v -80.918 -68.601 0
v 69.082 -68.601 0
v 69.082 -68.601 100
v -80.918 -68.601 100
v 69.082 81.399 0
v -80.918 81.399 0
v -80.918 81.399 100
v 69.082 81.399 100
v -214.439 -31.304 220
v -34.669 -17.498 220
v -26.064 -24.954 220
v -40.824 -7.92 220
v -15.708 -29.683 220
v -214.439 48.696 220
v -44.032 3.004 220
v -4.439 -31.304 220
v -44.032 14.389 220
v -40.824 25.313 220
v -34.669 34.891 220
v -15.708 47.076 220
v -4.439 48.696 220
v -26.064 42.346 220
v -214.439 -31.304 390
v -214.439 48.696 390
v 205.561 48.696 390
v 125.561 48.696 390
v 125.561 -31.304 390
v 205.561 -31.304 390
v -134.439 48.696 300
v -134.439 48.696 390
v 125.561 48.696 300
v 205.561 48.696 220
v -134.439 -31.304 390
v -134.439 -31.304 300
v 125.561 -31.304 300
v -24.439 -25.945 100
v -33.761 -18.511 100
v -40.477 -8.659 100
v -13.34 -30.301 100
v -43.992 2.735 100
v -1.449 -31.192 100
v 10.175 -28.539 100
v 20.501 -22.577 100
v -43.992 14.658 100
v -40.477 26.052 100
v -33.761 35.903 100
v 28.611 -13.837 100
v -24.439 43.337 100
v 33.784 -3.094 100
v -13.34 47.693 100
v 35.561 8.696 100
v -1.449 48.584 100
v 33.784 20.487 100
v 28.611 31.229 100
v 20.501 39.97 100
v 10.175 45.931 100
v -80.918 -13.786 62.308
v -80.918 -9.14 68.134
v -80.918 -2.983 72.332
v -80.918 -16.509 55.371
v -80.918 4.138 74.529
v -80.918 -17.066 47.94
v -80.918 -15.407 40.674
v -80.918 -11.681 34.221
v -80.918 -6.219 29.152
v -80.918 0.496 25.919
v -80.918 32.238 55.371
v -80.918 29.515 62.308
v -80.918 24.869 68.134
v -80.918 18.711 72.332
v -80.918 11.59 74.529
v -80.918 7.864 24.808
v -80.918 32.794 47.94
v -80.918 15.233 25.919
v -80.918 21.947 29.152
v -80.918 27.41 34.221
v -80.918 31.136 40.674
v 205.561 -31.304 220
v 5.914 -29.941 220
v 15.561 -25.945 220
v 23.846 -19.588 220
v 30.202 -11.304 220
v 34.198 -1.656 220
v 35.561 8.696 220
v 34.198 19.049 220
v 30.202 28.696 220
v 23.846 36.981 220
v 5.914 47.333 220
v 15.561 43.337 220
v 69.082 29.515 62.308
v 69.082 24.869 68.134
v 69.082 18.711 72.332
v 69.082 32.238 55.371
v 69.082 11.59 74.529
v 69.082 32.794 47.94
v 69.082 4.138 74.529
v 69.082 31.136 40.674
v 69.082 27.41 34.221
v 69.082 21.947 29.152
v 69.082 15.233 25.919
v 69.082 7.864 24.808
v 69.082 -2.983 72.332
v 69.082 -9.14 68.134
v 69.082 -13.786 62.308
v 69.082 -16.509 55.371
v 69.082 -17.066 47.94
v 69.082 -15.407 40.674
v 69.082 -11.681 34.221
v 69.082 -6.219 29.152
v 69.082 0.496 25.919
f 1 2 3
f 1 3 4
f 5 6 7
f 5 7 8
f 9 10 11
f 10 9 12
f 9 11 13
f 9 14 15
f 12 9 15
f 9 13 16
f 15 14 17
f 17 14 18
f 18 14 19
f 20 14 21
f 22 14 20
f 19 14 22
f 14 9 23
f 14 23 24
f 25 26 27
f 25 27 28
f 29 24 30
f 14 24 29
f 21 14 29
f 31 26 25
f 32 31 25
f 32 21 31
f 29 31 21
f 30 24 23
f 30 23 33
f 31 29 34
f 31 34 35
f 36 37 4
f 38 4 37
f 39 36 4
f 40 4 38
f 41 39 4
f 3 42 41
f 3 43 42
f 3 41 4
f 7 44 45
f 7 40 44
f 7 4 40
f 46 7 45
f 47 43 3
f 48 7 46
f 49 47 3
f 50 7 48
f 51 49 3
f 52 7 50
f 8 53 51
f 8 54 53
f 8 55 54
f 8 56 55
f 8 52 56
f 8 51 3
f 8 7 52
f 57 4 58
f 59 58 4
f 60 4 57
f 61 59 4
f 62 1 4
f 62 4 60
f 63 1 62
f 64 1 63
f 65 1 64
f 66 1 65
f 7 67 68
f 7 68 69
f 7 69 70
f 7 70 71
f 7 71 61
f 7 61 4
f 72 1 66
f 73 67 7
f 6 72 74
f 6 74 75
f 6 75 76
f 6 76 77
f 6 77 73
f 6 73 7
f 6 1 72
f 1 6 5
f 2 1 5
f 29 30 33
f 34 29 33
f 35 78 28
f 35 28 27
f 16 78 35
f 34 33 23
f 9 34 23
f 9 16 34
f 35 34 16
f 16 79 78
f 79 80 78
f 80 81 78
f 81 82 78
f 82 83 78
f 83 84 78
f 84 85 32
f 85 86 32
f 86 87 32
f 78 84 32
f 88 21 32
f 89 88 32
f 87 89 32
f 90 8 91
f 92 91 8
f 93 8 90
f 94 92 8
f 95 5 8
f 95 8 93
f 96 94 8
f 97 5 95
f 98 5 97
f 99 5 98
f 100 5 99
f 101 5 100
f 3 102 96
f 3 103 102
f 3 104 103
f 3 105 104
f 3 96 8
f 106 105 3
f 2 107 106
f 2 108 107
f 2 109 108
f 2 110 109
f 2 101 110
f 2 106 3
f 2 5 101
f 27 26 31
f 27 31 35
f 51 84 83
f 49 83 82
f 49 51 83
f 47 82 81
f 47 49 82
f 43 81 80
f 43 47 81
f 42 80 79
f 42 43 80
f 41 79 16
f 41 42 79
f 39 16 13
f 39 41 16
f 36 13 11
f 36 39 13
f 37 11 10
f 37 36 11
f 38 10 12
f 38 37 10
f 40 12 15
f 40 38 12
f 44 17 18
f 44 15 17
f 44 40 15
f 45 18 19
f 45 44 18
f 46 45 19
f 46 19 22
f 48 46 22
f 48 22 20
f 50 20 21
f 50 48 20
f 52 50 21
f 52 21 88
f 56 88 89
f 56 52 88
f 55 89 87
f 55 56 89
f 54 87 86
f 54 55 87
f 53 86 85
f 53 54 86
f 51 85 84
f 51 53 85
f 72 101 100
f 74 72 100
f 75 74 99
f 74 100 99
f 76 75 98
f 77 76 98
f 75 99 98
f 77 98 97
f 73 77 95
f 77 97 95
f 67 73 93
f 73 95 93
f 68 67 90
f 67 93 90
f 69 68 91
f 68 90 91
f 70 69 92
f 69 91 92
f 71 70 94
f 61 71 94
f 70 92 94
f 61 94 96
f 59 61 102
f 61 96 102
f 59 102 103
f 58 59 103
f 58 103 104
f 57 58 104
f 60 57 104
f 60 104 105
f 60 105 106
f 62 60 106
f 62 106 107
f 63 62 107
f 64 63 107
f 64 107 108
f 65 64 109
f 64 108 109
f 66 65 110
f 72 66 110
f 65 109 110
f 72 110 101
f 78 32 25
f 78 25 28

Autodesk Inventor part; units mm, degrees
ref_plane "YZ Plane" through (0, 0, 0) normal (1, 0, 0) x (0, 1, 0)
ref_plane "XZ Plane" through (0, 0, 0) normal (0, 1, 0) x (-1, 0, 0)
ref_plane "XY Plane" through (0, 0, 0) normal (0, 0, 1) x (1, 0, 0)
sketch "Sketch1" plane through (0, 0, 0) normal (0, 0, 1) x (1, 0, 0)
  line L0 (-80.9183, 81.3988) -> (69.0817, 81.3988)
  line L1 (69.0817, 81.3988) -> (69.0817, -68.6012)
  line L2 (69.0817, -68.6012) -> (-80.9183, -68.6012)
  line L3 (-80.9183, -68.6012) -> (-80.9183, 81.3988)
  line L4 (-80.9183, 81.3988) -> (69.0817, -68.6012) construction
  line L5 (69.0817, 81.3988) -> (-80.9183, -68.6012) construction
  point P0 (0, 0)
  point P1 (-5.9183, 6.3988)
  dimension "d0" = 150
  dimension "d1" = 150
extrude "Extrusion1" add sketch "Sketch1" along normal blind 100
sketch "Sketch2" plane through (0, 0, 100) normal (0, 0, 1) x (1, 0, 0)
  circle A0 centre (-4.4387, 8.6963) radius 40
  point P0 (0, 0)
  dimension "d4" = 80
extrude "Extrusion2" add sketch "Sketch2" along normal blind 120
sketch "Sketch3" plane through (-4.4387, 8.6963, 220) normal (0, 0, 1) x (1, 0, 0)
  line L0 (-210, 40) -> (210, 40)
  line L1 (210, 40) -> (210, -40)
  line L2 (210, -40) -> (-210, -40)
  line L3 (-210, -40) -> (-210, 40)
  circle A0 centre (0, 0) radius 40 projected
  line L4 (-210, 40) -> (210, -40) construction
  line L5 (210, 40) -> (-210, -40) construction
  point P0 (4.4387, -8.6963)
  dimension "d7" = 420
  dimension "d8" = 80
extrude "Extrusion3" add sketch "Sketch3" along normal blind 80
sketch "Sketch4" plane through (-4.4387, 8.6963, 300) normal (0, 0, 1) x (1, 0, 0)
  line L0 (210, 40) -> (-210, 40) projected
  line L1 (-210, -40) -> (210, -40) projected
  line L2 (-210, 40) -> (-130, 40)
  line L3 (-130, 40) -> (-130, -40)
  line L4 (-130, -40) -> (-210, -40)
  line L5 (-210, -40) -> (-210, 40)
  line L6 (210, -40) -> (210, 40) projected
  line L7 (210, 40) -> (130, 40)
  line L8 (130, 40) -> (130, -40)
  line L9 (130, -40) -> (210, -40)
  line L10 (210, -40) -> (210, 40)
  point P0 (4.4387, -8.6963)
  point P1 (130, 40)
  dimension "d11" = 80
  dimension "d12" = 80
extrude "Extrusion4" add sketch "Sketch4" along normal blind 90 contours L6 L1 L8 L0 | L3 L1 L5 L0
sketch "Sketch5" plane through (69.0817, -68.6012, 0) normal (1, 0, 0) x (0, 0, -1)
  circle A0 centre (-49.808, 76.4656) radius 25
  point P0 (0, 68.6012)
  dimension "d15" = 50
extrude "Extrusion5" cut sketch "Sketch5" against normal blind 500
properties part number "HOLDER"
